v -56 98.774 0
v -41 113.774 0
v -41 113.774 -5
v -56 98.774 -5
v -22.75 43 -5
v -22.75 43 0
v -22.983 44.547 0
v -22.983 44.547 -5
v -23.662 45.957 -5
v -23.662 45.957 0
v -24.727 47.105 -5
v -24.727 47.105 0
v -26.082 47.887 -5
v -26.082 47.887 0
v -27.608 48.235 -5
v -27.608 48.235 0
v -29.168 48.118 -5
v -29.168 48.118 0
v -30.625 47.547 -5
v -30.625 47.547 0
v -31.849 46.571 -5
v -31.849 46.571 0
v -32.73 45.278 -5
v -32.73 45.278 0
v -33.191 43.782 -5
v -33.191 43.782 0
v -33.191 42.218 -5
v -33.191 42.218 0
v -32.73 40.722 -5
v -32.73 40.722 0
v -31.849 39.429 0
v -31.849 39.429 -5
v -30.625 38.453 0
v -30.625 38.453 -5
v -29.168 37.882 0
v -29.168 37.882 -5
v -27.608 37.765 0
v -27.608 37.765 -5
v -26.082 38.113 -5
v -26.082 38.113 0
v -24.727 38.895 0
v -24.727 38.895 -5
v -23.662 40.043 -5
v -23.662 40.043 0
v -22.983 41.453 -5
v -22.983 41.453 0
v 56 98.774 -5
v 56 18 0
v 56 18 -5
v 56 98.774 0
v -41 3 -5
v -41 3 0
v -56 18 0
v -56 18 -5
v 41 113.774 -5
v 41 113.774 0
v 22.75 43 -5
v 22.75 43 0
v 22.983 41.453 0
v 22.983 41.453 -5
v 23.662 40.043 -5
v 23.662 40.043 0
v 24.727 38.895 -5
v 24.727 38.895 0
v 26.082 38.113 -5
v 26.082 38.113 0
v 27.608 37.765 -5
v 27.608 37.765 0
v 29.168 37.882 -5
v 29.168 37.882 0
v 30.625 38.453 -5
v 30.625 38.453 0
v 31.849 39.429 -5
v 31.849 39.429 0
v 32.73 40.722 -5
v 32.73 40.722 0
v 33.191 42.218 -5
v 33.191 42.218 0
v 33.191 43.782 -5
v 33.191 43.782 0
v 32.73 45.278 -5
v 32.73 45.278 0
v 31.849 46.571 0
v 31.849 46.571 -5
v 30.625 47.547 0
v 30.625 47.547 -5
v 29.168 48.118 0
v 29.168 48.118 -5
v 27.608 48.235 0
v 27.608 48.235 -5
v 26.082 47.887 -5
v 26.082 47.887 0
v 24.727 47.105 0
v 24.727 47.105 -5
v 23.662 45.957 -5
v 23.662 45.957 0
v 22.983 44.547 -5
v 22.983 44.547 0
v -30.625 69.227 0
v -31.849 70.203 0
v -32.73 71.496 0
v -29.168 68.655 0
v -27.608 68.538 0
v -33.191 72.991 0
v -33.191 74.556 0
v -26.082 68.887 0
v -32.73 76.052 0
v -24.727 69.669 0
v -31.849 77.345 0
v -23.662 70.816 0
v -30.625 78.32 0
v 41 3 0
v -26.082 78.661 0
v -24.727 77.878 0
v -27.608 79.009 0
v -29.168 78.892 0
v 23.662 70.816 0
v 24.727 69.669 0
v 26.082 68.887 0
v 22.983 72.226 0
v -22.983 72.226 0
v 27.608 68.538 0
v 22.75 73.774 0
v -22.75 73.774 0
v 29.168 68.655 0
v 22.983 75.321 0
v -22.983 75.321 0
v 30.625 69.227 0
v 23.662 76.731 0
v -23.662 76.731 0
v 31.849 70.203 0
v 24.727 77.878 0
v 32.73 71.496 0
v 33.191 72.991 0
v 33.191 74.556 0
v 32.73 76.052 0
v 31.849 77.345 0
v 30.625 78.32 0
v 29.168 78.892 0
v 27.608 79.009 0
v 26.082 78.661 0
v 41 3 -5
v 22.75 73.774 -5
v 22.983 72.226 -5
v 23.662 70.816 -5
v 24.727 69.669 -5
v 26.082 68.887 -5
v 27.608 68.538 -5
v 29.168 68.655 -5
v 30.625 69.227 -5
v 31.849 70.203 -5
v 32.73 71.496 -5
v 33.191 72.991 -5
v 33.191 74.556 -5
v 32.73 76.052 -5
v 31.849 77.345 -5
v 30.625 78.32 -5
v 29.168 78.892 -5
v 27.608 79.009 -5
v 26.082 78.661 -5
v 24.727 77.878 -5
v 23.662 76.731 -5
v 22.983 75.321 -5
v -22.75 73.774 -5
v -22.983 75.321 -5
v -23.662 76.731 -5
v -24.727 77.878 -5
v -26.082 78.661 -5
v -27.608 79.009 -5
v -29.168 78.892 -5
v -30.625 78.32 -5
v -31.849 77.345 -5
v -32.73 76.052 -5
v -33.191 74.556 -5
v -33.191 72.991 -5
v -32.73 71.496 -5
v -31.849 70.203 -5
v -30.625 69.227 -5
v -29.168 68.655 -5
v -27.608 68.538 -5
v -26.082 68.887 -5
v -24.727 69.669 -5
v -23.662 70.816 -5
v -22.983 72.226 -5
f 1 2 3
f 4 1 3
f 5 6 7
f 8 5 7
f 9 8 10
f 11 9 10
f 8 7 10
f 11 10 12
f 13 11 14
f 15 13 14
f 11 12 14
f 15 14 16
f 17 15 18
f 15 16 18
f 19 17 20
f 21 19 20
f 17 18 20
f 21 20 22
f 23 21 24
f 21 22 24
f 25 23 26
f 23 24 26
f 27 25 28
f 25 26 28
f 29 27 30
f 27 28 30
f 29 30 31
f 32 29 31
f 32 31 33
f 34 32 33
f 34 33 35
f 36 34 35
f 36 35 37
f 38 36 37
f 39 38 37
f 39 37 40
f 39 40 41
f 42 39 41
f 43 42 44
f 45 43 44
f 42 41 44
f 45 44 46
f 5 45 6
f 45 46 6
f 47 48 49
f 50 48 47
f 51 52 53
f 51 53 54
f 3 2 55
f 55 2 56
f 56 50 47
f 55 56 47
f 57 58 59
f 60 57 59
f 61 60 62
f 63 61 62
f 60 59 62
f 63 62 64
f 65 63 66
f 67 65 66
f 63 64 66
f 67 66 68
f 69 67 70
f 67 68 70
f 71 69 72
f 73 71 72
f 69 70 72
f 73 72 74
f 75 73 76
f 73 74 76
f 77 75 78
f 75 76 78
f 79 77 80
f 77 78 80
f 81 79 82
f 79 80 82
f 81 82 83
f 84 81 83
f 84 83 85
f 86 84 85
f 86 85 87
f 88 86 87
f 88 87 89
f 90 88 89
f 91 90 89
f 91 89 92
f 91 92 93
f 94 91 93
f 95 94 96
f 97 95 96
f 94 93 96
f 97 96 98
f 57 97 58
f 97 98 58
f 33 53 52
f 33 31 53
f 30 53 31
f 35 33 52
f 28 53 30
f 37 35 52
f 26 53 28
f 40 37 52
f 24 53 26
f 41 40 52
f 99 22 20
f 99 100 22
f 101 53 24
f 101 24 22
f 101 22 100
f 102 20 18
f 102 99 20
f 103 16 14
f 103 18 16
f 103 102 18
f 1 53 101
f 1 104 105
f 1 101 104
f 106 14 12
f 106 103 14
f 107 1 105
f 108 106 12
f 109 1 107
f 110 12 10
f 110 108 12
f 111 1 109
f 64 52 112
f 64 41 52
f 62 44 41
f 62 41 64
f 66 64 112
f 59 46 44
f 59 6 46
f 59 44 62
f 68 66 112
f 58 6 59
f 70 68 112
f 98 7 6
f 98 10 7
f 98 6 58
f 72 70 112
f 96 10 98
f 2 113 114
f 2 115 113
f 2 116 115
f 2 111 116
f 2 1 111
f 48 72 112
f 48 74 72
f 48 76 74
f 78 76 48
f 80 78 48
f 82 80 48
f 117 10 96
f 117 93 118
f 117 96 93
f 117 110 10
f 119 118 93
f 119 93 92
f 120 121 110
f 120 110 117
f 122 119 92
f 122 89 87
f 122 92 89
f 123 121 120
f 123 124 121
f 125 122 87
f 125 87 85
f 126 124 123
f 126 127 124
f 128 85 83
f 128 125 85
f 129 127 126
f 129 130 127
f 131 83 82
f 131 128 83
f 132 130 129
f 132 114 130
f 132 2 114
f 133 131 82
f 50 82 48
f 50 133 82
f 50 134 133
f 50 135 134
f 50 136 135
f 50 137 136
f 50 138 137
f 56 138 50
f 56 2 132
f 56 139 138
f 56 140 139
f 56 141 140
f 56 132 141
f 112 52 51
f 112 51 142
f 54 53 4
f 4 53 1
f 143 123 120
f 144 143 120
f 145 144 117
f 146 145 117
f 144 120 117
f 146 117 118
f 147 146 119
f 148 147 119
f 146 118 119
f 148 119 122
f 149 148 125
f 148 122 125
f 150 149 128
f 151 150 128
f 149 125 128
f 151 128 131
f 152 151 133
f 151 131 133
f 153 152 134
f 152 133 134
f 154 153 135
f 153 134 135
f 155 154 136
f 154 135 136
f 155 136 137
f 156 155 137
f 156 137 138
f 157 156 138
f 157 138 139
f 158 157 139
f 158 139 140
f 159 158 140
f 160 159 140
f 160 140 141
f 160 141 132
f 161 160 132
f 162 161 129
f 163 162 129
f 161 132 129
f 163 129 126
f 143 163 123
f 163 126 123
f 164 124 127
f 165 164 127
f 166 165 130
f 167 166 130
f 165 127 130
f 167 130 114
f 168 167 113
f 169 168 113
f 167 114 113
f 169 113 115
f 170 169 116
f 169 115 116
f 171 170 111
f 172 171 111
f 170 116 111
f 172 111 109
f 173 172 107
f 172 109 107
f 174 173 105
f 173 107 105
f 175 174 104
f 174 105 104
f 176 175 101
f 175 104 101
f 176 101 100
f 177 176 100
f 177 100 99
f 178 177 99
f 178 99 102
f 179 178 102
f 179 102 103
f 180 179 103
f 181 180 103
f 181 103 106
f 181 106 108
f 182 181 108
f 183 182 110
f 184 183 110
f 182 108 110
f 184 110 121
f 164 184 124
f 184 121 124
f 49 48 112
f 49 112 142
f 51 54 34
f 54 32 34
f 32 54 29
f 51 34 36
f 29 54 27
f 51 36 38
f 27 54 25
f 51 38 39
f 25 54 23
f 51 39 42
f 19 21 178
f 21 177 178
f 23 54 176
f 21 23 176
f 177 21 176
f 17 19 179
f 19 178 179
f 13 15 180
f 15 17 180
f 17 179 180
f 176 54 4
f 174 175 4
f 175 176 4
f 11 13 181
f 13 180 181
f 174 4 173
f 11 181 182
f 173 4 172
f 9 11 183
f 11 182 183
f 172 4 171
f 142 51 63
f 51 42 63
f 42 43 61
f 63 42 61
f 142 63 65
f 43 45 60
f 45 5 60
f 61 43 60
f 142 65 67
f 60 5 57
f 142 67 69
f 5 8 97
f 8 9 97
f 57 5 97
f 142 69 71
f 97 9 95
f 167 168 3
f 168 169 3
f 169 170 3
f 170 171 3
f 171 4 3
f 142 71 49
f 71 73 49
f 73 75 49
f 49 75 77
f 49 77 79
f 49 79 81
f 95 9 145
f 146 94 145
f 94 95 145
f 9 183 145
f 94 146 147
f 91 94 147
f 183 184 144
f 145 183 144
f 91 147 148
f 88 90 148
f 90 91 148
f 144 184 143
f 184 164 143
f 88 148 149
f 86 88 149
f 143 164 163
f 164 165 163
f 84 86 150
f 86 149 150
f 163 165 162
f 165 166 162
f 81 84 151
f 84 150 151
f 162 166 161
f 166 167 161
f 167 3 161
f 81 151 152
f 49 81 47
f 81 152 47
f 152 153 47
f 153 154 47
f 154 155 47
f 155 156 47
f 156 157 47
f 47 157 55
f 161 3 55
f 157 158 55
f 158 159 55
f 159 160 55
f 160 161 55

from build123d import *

# Parameters (mm, degrees)
SKETCH_1_W             = 112
SKETCH_1_H             = 110.77381068
SKETCH_1_R             = 5.25
SM_BASE_FLANGE_1_DEPTH = 5
CHAMFER_1_SIZE         = 15


# Sheet-metal steps are written as plain solids
with BuildPart() as part:
    # Sketch 1 → Базовая кромка1 (new body)
    with BuildSketch(Plane.XY):
        with Locations((0, 58.38690534)):
            Rectangle(SKETCH_1_W, SKETCH_1_H)
        with Locations((-28, 73.77381068)):
            Circle(SKETCH_1_R, mode=Mode.SUBTRACT)
        with Locations((-28, 43)):
            Circle(SKETCH_1_R, mode=Mode.SUBTRACT)
        with Locations(Location((28, 73.77381068, 0), (0, 0, 180))):
            Circle(SKETCH_1_R, mode=Mode.SUBTRACT)
        with Locations(Location((28, 43, 0), (0, 0, 180))):
            Circle(SKETCH_1_R, mode=Mode.SUBTRACT)
    extrude(amount=-SM_BASE_FLANGE_1_DEPTH)

    # Фаска1
    chamfer_1_edges = [part.edges().sort_by_distance(p)[0] for p in [
        (56, 3, -2.5),
        (-56, 3, -2.5),
        (-56, 113.77381068, -2.5),
        (56, 113.77381068, -2.5),
    ]]
    chamfer(chamfer_1_edges, length=CHAMFER_1_SIZE)


solid = part.part
